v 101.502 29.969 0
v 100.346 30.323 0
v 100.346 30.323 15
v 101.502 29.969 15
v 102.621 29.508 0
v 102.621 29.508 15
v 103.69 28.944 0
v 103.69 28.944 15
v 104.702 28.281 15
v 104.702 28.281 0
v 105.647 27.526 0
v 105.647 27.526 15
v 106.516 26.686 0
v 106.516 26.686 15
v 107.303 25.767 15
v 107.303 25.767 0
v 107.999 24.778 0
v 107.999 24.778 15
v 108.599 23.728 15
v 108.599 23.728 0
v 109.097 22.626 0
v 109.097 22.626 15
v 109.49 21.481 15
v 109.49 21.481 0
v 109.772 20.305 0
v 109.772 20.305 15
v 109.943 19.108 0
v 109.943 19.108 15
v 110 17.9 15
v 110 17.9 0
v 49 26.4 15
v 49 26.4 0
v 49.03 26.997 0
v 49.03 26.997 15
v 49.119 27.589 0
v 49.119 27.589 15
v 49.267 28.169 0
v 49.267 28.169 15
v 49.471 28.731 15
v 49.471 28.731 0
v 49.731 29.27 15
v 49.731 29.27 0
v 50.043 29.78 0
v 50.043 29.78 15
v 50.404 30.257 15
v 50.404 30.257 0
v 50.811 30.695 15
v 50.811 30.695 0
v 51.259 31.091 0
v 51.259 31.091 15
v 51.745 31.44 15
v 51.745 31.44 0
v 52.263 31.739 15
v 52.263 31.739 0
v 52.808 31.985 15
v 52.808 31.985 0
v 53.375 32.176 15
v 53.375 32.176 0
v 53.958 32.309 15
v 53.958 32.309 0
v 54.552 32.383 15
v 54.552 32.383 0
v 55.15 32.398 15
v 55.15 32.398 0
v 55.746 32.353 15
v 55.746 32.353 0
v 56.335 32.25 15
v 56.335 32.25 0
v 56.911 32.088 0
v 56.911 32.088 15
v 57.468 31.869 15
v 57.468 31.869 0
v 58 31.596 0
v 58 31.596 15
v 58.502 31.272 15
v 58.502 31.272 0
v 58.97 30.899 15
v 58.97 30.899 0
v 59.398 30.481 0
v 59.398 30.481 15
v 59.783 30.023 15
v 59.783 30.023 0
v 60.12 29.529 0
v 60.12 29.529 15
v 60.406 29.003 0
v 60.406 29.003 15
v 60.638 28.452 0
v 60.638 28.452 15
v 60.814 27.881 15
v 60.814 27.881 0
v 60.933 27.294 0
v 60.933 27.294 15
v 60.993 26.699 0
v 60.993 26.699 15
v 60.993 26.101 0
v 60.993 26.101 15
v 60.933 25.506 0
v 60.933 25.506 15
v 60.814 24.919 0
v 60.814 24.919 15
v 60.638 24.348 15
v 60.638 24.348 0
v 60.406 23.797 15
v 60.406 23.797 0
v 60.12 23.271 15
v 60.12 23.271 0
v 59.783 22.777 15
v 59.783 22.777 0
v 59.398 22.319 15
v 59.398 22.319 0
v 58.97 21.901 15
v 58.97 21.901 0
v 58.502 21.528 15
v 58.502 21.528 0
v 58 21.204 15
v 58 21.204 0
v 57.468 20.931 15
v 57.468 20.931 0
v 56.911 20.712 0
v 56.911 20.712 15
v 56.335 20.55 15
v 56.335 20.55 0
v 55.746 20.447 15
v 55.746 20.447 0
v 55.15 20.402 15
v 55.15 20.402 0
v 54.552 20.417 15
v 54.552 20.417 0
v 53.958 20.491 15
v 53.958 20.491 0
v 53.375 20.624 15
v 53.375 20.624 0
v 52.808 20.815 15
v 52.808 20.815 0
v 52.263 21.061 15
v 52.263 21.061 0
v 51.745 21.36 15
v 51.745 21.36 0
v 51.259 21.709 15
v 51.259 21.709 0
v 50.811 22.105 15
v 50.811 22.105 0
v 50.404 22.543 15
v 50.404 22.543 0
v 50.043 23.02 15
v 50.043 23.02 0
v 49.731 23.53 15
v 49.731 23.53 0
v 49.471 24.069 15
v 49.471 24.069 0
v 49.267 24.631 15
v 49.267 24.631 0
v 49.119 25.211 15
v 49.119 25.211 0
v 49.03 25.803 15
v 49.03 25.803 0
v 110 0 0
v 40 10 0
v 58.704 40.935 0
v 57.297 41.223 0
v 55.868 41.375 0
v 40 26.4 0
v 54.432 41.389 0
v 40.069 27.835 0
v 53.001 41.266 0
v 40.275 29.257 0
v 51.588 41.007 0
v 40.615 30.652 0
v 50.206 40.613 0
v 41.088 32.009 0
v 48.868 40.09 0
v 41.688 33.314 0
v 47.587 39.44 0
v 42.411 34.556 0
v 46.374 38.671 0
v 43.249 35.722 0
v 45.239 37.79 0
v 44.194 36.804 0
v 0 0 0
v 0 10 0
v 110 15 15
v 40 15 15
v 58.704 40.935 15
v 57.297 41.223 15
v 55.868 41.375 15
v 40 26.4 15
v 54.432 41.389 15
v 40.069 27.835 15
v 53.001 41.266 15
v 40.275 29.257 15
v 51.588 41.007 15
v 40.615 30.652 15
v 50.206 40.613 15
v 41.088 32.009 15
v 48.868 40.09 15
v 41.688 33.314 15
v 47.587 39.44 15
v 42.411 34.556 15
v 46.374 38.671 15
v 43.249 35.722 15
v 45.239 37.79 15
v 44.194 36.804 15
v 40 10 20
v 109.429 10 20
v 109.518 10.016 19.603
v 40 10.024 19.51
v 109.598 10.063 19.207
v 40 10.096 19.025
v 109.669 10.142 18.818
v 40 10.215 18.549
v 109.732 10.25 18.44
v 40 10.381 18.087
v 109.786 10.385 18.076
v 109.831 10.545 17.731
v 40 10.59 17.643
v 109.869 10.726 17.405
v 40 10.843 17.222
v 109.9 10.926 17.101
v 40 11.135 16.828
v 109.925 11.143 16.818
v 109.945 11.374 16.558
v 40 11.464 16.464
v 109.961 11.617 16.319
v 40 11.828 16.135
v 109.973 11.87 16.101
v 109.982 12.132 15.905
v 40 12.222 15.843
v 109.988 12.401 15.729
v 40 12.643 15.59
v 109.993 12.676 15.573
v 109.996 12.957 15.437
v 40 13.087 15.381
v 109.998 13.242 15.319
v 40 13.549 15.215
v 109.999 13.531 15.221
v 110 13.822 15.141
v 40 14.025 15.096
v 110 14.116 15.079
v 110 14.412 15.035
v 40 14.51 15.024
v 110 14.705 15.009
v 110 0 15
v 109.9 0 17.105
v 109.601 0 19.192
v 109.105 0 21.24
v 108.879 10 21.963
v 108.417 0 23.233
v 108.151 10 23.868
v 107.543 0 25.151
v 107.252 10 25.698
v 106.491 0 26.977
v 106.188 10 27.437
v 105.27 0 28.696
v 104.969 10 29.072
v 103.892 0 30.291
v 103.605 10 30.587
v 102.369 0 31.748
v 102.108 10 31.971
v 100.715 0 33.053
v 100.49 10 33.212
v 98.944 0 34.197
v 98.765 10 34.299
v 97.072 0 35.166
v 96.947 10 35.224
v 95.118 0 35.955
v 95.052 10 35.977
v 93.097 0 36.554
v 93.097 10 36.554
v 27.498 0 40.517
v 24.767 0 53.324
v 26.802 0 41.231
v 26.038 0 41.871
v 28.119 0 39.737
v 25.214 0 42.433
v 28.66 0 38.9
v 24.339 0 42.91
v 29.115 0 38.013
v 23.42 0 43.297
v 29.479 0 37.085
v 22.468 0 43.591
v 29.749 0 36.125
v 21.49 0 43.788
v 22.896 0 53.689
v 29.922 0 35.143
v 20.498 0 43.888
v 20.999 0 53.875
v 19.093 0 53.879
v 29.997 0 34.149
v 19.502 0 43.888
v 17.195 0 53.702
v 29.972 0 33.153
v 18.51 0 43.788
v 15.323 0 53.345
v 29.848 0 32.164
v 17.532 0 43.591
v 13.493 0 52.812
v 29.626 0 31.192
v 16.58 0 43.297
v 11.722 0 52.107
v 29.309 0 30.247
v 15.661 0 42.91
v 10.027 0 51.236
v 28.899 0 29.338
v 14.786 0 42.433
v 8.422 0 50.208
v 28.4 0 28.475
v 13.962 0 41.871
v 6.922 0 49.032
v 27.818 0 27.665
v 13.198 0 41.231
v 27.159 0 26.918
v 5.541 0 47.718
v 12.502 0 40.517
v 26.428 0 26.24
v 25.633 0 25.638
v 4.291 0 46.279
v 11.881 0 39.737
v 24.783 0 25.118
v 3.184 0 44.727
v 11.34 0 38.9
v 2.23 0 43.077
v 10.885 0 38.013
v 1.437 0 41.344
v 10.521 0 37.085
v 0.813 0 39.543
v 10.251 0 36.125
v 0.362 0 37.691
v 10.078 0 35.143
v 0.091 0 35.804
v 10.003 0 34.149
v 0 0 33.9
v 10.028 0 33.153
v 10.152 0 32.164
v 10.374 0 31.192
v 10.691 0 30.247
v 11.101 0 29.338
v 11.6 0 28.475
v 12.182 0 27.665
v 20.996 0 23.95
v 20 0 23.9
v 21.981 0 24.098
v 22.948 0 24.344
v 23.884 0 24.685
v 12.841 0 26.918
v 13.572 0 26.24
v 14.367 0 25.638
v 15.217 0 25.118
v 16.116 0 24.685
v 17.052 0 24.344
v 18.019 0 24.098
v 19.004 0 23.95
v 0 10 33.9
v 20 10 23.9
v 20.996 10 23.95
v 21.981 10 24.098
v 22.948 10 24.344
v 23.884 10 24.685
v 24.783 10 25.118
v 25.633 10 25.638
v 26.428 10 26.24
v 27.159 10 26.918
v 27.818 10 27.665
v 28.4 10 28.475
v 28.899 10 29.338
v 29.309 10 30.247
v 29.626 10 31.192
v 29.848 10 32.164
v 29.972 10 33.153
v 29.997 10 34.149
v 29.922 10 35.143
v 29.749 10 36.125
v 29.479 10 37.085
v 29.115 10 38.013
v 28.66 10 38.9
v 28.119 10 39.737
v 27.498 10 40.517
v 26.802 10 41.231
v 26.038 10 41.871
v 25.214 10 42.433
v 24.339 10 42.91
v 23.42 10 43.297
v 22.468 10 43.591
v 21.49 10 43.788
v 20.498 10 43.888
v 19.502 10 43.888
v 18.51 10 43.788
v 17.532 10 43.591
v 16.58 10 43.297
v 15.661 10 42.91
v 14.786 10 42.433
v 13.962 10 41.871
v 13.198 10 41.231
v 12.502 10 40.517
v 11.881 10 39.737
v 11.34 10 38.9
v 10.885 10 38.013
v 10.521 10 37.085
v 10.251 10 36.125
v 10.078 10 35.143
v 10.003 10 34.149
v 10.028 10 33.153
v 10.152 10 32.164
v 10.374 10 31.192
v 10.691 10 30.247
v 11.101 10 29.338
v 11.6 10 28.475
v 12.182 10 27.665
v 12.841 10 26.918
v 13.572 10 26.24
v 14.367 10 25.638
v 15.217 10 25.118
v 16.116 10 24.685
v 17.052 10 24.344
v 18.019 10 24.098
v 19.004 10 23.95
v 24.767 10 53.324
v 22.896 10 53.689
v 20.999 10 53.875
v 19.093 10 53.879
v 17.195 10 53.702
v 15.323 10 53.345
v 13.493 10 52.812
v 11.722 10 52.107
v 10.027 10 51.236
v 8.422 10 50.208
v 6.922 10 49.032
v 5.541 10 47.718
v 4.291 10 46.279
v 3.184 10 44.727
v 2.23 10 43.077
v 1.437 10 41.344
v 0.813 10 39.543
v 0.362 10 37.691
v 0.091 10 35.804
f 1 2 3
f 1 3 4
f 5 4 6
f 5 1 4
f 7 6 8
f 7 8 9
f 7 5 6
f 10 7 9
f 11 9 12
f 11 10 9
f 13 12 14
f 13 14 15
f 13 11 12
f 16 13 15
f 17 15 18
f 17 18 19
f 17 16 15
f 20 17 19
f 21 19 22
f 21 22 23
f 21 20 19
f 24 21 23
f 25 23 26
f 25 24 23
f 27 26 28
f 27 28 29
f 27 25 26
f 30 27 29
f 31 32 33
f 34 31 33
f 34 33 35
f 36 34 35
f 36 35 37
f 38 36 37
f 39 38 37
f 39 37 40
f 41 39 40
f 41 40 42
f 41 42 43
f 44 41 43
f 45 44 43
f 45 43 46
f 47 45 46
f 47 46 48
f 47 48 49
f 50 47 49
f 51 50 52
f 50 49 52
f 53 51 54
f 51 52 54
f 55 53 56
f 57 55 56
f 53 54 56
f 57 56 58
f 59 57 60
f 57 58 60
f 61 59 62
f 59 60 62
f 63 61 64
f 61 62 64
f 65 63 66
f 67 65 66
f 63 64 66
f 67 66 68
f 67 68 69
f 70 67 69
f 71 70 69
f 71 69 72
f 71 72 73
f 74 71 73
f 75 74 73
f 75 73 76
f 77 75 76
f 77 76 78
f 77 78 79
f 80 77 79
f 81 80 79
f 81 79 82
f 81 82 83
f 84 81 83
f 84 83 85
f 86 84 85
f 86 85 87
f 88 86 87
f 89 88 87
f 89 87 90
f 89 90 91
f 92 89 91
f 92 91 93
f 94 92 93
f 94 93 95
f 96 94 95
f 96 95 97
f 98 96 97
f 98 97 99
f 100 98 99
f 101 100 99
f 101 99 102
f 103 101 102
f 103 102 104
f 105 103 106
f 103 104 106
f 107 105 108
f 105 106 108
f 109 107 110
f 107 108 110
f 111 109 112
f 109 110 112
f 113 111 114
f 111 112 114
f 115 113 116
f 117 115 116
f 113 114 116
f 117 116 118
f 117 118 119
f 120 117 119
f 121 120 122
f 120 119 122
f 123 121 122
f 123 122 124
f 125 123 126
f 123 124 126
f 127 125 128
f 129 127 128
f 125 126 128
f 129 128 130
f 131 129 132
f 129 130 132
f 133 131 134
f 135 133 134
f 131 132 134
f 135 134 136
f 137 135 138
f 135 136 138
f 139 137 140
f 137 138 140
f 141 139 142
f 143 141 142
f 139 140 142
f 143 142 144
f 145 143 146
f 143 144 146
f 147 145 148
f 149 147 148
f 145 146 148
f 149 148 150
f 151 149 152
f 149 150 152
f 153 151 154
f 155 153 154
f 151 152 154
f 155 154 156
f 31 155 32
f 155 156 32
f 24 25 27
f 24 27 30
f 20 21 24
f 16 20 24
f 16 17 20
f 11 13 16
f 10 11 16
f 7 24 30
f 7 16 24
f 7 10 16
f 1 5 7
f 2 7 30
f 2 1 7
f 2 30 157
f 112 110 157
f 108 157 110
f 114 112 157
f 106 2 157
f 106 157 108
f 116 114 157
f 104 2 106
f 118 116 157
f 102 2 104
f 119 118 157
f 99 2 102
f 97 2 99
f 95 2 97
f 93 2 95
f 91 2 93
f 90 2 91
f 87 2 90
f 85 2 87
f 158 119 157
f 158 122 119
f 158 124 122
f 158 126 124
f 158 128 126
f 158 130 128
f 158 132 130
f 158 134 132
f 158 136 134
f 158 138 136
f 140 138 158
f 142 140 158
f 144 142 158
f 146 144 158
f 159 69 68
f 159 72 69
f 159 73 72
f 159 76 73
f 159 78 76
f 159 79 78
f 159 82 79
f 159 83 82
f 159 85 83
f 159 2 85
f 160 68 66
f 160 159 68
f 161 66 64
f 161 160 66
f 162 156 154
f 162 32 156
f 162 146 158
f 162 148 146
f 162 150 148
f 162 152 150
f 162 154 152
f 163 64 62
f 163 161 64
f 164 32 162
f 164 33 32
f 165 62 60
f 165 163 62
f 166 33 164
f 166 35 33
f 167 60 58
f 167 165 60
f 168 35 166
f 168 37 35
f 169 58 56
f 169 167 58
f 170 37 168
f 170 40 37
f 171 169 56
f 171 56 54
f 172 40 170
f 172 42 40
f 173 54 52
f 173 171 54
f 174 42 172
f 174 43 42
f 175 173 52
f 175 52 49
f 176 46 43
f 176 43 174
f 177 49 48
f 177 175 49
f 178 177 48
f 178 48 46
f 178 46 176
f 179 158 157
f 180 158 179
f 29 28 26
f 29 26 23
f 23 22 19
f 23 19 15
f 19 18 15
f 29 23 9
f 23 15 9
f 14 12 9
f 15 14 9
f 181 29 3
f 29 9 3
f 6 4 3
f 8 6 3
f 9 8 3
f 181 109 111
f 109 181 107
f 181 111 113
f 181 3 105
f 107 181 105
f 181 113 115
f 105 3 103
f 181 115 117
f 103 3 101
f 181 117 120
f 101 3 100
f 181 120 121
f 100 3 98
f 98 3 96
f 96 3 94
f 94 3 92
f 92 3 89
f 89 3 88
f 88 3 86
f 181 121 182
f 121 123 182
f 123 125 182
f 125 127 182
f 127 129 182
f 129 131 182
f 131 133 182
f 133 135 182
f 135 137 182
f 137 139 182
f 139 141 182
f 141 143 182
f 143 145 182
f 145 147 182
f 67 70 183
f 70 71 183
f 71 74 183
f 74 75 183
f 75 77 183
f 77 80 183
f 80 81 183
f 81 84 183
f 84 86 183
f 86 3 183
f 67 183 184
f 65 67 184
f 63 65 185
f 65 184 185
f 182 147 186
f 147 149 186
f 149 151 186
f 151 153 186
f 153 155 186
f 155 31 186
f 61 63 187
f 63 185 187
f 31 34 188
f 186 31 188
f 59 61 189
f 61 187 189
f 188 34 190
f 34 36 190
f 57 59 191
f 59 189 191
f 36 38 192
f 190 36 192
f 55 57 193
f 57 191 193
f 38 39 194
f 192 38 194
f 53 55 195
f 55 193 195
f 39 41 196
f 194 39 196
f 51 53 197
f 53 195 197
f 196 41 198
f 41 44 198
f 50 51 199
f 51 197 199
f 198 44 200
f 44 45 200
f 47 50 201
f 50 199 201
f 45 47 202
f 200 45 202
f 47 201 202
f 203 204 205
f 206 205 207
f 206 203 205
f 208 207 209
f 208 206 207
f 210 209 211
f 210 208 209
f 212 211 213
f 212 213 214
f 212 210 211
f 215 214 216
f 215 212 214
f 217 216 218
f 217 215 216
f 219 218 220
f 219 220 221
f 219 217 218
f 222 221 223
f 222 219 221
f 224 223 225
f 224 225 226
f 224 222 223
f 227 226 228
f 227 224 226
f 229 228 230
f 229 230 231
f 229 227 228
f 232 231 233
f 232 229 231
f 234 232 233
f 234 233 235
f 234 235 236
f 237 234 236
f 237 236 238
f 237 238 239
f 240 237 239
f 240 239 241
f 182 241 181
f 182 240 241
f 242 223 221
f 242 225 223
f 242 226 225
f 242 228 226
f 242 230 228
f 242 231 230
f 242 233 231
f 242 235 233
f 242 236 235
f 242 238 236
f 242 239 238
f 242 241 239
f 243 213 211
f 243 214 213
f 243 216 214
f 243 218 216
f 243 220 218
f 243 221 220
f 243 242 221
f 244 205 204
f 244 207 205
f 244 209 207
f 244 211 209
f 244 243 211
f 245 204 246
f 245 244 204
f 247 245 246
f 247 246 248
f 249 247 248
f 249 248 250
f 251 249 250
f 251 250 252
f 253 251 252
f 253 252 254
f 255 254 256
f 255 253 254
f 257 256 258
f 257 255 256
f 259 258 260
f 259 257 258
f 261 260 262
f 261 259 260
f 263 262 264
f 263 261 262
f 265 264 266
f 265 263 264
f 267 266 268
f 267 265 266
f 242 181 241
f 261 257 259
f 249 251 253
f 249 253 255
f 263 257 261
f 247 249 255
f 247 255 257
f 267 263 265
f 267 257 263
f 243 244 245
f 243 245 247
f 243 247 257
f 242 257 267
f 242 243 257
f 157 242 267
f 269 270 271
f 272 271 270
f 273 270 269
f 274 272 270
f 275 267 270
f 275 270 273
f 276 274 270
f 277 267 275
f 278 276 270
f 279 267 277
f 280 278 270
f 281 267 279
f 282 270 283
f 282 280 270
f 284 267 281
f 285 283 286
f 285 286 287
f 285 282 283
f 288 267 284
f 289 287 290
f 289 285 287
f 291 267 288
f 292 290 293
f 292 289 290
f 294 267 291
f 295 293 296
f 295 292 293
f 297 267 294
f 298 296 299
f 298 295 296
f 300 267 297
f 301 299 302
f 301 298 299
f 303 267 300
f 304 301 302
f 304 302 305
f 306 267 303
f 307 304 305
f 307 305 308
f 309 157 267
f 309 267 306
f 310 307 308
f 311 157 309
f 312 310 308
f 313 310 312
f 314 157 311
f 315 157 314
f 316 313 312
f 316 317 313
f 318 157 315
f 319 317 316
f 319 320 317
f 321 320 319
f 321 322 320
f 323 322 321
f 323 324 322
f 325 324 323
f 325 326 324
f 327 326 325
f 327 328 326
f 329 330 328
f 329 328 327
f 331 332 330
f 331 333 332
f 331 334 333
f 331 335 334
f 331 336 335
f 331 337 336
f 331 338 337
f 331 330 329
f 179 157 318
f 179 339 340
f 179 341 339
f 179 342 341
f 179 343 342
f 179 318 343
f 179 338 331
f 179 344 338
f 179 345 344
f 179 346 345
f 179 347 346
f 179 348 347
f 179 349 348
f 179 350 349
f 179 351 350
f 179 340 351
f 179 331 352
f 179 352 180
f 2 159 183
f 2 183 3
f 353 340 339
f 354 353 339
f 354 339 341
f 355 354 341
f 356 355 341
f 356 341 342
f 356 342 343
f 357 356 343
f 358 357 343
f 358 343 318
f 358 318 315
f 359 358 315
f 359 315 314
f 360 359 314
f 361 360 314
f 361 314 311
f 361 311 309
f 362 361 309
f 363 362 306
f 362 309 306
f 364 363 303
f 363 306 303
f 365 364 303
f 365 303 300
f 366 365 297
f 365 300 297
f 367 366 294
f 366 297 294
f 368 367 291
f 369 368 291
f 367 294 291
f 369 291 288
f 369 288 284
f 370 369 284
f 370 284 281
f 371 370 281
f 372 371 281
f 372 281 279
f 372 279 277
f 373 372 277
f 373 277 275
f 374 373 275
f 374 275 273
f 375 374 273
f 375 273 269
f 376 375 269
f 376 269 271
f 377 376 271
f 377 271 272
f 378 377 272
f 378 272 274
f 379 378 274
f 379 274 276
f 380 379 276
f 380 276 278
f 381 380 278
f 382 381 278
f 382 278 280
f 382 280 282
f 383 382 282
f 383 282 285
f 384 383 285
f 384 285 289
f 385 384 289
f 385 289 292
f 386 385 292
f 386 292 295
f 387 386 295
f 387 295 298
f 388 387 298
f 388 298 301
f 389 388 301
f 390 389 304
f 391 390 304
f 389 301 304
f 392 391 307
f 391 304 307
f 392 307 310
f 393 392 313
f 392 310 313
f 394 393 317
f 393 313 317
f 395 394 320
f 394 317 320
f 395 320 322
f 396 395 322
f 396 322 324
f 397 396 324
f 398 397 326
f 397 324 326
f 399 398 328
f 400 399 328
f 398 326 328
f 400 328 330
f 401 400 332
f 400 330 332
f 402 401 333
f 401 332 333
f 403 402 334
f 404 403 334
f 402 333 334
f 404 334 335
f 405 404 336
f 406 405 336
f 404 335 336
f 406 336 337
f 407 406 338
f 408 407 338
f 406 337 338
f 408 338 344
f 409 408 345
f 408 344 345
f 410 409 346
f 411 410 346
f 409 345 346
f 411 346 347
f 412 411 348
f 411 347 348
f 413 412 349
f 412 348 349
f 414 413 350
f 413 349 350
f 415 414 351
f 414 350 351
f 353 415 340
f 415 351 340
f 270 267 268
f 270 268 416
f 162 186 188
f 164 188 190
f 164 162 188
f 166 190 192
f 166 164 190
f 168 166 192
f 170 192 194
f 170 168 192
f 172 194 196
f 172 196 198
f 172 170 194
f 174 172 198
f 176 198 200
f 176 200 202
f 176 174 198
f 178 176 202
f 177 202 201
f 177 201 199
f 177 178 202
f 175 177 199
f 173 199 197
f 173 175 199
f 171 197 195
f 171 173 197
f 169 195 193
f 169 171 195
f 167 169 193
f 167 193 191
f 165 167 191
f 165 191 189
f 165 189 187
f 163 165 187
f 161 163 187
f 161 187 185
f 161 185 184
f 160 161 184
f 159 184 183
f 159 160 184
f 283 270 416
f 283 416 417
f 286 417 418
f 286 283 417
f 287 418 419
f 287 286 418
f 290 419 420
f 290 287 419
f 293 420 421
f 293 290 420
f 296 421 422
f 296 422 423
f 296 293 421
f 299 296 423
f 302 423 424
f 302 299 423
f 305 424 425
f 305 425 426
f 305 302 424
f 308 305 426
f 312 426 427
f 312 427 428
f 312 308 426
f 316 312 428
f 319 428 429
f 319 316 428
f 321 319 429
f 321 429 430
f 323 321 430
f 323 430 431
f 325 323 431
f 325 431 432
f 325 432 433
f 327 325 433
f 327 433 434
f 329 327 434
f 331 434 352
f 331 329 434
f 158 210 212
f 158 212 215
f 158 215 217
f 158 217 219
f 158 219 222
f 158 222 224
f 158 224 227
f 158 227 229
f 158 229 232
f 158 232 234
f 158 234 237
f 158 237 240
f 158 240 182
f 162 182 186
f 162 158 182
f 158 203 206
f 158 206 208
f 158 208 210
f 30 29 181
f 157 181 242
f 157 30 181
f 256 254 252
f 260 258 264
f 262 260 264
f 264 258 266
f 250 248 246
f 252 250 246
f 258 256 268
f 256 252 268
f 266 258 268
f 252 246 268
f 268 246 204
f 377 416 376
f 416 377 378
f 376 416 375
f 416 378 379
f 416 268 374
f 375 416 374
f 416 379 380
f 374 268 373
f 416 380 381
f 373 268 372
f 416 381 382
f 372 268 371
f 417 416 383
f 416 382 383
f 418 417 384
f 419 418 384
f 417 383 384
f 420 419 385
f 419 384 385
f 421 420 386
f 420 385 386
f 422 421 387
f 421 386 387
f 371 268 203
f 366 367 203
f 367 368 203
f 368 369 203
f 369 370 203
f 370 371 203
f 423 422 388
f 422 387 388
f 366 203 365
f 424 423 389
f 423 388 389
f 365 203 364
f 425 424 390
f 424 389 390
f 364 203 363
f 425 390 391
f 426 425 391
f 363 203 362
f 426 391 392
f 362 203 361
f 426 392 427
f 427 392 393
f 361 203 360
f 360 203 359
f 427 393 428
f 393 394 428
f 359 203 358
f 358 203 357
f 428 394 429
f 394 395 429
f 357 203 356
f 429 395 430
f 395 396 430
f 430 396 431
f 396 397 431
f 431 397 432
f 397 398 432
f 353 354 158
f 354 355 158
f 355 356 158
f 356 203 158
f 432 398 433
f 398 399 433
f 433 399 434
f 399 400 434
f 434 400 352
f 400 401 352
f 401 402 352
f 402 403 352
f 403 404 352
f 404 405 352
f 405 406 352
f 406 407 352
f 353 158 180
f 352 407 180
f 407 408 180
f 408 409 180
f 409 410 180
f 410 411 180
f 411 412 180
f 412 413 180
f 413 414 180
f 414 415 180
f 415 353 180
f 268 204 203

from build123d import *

# Parameters (mm, degrees)
BOSS_EXTRUDE1_DEPTH        = 10
BOSS_EXTRUDE2_DEPTH        = 15
F_20_0_20_DIAMETER_HOLE1_D = 20
F_12_0_12_DIAMETER_HOLE1_D = 12
FILLET1_R                  = 5


with BuildPart() as part:
    # Sketch2 → Boss-Extrude1 (new body)
    with BuildSketch(Plane(origin=(0, 0, 0), x_dir=(1, 0, 0), z_dir=(0, 1, 0))):
        with BuildLine():
            Line((0, 0), (110, 0))
            Line((110, 0), (110, -15))
            ThreePointArc((110, -15), (105.270148503, -28.695601287), (93.096662434, -36.553541647))
            Line((93.096662434, -36.553541647), (24.767095445, -53.323563036))
            ThreePointArc((24.767095445, -53.323563036), (7.657834649, -49.637565074), (0, -33.9))
            Line((0, -33.9), (0, 0))
        make_face()
    extrude(amount=BOSS_EXTRUDE1_DEPTH)

    # Sketch4 → Boss-Extrude2 (add)
    with BuildSketch(Plane(origin=(0, 0, 0), x_dir=(-1, 0, 0), z_dir=(0, 0, -1))):
        with BuildLine():
            Line((-110, 10), (-40, 10))
            Line((-40, 10), (-40, 26.4))
            ThreePointArc((-40, 26.4), (-45.795793145, 38.24409457), (-58.70434349, 40.935399523))
            Line((-58.70434349, 40.935399523), (-100.345866401, 30.323066228))
            ThreePointArc((-100.345866401, 30.323066228), (-107.302721394, 25.766620463), (-110, 17.9))
            Line((-110, 17.9), (-110, 10))
        make_face()
    extrude(amount=-BOSS_EXTRUDE2_DEPTH)

    # Ø20.0 (20) Diameter Hole1 (through all)
    with Locations(Plane(origin=(20, 10, 33.9), x_dir=(0, 0, 1), z_dir=(0, 1, 0))):
        with Locations((0, 0)):
            Hole(F_20_0_20_DIAMETER_HOLE1_D / 2)

    # Ø12.0 (12) Diameter Hole1 (through all)
    with Locations(Plane(origin=(55, 26.4, 15), x_dir=(1, 0, 0), z_dir=(0, 0, 1))):
        with Locations((0, 0)):
            Hole(F_12_0_12_DIAMETER_HOLE1_D / 2)

    # Fillet1
    fillet1_edges = [part.edges().sort_by_distance(p)[0] for p in [
        (75, 10, 15),
    ]]
    fillet(fillet1_edges, radius=FILLET1_R)


solid = part.part
